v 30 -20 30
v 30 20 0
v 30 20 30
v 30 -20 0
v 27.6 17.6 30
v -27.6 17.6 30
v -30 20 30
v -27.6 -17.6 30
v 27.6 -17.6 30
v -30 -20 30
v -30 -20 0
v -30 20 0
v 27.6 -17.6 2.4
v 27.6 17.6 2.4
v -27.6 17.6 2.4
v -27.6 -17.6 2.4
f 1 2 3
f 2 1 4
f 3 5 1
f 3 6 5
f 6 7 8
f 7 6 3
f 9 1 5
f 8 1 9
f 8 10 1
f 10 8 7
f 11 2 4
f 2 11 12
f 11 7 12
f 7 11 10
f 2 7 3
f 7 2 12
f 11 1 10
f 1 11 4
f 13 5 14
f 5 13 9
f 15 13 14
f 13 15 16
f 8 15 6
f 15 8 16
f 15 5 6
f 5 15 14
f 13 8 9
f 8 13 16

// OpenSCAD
outer_length = 60; outer_width = 40; outer_height = 30; wall_thickness = 2.4; floor_thickness = 2.4;
difference() {
  translate([-outer_length/2, -outer_width/2, 0]) cube([outer_length, outer_width, outer_height]);
  translate([-outer_length/2 + wall_thickness, -outer_width/2 + wall_thickness, floor_thickness])
    cube([outer_length - 2*wall_thickness, outer_width - 2*wall_thickness, outer_height]);
}
